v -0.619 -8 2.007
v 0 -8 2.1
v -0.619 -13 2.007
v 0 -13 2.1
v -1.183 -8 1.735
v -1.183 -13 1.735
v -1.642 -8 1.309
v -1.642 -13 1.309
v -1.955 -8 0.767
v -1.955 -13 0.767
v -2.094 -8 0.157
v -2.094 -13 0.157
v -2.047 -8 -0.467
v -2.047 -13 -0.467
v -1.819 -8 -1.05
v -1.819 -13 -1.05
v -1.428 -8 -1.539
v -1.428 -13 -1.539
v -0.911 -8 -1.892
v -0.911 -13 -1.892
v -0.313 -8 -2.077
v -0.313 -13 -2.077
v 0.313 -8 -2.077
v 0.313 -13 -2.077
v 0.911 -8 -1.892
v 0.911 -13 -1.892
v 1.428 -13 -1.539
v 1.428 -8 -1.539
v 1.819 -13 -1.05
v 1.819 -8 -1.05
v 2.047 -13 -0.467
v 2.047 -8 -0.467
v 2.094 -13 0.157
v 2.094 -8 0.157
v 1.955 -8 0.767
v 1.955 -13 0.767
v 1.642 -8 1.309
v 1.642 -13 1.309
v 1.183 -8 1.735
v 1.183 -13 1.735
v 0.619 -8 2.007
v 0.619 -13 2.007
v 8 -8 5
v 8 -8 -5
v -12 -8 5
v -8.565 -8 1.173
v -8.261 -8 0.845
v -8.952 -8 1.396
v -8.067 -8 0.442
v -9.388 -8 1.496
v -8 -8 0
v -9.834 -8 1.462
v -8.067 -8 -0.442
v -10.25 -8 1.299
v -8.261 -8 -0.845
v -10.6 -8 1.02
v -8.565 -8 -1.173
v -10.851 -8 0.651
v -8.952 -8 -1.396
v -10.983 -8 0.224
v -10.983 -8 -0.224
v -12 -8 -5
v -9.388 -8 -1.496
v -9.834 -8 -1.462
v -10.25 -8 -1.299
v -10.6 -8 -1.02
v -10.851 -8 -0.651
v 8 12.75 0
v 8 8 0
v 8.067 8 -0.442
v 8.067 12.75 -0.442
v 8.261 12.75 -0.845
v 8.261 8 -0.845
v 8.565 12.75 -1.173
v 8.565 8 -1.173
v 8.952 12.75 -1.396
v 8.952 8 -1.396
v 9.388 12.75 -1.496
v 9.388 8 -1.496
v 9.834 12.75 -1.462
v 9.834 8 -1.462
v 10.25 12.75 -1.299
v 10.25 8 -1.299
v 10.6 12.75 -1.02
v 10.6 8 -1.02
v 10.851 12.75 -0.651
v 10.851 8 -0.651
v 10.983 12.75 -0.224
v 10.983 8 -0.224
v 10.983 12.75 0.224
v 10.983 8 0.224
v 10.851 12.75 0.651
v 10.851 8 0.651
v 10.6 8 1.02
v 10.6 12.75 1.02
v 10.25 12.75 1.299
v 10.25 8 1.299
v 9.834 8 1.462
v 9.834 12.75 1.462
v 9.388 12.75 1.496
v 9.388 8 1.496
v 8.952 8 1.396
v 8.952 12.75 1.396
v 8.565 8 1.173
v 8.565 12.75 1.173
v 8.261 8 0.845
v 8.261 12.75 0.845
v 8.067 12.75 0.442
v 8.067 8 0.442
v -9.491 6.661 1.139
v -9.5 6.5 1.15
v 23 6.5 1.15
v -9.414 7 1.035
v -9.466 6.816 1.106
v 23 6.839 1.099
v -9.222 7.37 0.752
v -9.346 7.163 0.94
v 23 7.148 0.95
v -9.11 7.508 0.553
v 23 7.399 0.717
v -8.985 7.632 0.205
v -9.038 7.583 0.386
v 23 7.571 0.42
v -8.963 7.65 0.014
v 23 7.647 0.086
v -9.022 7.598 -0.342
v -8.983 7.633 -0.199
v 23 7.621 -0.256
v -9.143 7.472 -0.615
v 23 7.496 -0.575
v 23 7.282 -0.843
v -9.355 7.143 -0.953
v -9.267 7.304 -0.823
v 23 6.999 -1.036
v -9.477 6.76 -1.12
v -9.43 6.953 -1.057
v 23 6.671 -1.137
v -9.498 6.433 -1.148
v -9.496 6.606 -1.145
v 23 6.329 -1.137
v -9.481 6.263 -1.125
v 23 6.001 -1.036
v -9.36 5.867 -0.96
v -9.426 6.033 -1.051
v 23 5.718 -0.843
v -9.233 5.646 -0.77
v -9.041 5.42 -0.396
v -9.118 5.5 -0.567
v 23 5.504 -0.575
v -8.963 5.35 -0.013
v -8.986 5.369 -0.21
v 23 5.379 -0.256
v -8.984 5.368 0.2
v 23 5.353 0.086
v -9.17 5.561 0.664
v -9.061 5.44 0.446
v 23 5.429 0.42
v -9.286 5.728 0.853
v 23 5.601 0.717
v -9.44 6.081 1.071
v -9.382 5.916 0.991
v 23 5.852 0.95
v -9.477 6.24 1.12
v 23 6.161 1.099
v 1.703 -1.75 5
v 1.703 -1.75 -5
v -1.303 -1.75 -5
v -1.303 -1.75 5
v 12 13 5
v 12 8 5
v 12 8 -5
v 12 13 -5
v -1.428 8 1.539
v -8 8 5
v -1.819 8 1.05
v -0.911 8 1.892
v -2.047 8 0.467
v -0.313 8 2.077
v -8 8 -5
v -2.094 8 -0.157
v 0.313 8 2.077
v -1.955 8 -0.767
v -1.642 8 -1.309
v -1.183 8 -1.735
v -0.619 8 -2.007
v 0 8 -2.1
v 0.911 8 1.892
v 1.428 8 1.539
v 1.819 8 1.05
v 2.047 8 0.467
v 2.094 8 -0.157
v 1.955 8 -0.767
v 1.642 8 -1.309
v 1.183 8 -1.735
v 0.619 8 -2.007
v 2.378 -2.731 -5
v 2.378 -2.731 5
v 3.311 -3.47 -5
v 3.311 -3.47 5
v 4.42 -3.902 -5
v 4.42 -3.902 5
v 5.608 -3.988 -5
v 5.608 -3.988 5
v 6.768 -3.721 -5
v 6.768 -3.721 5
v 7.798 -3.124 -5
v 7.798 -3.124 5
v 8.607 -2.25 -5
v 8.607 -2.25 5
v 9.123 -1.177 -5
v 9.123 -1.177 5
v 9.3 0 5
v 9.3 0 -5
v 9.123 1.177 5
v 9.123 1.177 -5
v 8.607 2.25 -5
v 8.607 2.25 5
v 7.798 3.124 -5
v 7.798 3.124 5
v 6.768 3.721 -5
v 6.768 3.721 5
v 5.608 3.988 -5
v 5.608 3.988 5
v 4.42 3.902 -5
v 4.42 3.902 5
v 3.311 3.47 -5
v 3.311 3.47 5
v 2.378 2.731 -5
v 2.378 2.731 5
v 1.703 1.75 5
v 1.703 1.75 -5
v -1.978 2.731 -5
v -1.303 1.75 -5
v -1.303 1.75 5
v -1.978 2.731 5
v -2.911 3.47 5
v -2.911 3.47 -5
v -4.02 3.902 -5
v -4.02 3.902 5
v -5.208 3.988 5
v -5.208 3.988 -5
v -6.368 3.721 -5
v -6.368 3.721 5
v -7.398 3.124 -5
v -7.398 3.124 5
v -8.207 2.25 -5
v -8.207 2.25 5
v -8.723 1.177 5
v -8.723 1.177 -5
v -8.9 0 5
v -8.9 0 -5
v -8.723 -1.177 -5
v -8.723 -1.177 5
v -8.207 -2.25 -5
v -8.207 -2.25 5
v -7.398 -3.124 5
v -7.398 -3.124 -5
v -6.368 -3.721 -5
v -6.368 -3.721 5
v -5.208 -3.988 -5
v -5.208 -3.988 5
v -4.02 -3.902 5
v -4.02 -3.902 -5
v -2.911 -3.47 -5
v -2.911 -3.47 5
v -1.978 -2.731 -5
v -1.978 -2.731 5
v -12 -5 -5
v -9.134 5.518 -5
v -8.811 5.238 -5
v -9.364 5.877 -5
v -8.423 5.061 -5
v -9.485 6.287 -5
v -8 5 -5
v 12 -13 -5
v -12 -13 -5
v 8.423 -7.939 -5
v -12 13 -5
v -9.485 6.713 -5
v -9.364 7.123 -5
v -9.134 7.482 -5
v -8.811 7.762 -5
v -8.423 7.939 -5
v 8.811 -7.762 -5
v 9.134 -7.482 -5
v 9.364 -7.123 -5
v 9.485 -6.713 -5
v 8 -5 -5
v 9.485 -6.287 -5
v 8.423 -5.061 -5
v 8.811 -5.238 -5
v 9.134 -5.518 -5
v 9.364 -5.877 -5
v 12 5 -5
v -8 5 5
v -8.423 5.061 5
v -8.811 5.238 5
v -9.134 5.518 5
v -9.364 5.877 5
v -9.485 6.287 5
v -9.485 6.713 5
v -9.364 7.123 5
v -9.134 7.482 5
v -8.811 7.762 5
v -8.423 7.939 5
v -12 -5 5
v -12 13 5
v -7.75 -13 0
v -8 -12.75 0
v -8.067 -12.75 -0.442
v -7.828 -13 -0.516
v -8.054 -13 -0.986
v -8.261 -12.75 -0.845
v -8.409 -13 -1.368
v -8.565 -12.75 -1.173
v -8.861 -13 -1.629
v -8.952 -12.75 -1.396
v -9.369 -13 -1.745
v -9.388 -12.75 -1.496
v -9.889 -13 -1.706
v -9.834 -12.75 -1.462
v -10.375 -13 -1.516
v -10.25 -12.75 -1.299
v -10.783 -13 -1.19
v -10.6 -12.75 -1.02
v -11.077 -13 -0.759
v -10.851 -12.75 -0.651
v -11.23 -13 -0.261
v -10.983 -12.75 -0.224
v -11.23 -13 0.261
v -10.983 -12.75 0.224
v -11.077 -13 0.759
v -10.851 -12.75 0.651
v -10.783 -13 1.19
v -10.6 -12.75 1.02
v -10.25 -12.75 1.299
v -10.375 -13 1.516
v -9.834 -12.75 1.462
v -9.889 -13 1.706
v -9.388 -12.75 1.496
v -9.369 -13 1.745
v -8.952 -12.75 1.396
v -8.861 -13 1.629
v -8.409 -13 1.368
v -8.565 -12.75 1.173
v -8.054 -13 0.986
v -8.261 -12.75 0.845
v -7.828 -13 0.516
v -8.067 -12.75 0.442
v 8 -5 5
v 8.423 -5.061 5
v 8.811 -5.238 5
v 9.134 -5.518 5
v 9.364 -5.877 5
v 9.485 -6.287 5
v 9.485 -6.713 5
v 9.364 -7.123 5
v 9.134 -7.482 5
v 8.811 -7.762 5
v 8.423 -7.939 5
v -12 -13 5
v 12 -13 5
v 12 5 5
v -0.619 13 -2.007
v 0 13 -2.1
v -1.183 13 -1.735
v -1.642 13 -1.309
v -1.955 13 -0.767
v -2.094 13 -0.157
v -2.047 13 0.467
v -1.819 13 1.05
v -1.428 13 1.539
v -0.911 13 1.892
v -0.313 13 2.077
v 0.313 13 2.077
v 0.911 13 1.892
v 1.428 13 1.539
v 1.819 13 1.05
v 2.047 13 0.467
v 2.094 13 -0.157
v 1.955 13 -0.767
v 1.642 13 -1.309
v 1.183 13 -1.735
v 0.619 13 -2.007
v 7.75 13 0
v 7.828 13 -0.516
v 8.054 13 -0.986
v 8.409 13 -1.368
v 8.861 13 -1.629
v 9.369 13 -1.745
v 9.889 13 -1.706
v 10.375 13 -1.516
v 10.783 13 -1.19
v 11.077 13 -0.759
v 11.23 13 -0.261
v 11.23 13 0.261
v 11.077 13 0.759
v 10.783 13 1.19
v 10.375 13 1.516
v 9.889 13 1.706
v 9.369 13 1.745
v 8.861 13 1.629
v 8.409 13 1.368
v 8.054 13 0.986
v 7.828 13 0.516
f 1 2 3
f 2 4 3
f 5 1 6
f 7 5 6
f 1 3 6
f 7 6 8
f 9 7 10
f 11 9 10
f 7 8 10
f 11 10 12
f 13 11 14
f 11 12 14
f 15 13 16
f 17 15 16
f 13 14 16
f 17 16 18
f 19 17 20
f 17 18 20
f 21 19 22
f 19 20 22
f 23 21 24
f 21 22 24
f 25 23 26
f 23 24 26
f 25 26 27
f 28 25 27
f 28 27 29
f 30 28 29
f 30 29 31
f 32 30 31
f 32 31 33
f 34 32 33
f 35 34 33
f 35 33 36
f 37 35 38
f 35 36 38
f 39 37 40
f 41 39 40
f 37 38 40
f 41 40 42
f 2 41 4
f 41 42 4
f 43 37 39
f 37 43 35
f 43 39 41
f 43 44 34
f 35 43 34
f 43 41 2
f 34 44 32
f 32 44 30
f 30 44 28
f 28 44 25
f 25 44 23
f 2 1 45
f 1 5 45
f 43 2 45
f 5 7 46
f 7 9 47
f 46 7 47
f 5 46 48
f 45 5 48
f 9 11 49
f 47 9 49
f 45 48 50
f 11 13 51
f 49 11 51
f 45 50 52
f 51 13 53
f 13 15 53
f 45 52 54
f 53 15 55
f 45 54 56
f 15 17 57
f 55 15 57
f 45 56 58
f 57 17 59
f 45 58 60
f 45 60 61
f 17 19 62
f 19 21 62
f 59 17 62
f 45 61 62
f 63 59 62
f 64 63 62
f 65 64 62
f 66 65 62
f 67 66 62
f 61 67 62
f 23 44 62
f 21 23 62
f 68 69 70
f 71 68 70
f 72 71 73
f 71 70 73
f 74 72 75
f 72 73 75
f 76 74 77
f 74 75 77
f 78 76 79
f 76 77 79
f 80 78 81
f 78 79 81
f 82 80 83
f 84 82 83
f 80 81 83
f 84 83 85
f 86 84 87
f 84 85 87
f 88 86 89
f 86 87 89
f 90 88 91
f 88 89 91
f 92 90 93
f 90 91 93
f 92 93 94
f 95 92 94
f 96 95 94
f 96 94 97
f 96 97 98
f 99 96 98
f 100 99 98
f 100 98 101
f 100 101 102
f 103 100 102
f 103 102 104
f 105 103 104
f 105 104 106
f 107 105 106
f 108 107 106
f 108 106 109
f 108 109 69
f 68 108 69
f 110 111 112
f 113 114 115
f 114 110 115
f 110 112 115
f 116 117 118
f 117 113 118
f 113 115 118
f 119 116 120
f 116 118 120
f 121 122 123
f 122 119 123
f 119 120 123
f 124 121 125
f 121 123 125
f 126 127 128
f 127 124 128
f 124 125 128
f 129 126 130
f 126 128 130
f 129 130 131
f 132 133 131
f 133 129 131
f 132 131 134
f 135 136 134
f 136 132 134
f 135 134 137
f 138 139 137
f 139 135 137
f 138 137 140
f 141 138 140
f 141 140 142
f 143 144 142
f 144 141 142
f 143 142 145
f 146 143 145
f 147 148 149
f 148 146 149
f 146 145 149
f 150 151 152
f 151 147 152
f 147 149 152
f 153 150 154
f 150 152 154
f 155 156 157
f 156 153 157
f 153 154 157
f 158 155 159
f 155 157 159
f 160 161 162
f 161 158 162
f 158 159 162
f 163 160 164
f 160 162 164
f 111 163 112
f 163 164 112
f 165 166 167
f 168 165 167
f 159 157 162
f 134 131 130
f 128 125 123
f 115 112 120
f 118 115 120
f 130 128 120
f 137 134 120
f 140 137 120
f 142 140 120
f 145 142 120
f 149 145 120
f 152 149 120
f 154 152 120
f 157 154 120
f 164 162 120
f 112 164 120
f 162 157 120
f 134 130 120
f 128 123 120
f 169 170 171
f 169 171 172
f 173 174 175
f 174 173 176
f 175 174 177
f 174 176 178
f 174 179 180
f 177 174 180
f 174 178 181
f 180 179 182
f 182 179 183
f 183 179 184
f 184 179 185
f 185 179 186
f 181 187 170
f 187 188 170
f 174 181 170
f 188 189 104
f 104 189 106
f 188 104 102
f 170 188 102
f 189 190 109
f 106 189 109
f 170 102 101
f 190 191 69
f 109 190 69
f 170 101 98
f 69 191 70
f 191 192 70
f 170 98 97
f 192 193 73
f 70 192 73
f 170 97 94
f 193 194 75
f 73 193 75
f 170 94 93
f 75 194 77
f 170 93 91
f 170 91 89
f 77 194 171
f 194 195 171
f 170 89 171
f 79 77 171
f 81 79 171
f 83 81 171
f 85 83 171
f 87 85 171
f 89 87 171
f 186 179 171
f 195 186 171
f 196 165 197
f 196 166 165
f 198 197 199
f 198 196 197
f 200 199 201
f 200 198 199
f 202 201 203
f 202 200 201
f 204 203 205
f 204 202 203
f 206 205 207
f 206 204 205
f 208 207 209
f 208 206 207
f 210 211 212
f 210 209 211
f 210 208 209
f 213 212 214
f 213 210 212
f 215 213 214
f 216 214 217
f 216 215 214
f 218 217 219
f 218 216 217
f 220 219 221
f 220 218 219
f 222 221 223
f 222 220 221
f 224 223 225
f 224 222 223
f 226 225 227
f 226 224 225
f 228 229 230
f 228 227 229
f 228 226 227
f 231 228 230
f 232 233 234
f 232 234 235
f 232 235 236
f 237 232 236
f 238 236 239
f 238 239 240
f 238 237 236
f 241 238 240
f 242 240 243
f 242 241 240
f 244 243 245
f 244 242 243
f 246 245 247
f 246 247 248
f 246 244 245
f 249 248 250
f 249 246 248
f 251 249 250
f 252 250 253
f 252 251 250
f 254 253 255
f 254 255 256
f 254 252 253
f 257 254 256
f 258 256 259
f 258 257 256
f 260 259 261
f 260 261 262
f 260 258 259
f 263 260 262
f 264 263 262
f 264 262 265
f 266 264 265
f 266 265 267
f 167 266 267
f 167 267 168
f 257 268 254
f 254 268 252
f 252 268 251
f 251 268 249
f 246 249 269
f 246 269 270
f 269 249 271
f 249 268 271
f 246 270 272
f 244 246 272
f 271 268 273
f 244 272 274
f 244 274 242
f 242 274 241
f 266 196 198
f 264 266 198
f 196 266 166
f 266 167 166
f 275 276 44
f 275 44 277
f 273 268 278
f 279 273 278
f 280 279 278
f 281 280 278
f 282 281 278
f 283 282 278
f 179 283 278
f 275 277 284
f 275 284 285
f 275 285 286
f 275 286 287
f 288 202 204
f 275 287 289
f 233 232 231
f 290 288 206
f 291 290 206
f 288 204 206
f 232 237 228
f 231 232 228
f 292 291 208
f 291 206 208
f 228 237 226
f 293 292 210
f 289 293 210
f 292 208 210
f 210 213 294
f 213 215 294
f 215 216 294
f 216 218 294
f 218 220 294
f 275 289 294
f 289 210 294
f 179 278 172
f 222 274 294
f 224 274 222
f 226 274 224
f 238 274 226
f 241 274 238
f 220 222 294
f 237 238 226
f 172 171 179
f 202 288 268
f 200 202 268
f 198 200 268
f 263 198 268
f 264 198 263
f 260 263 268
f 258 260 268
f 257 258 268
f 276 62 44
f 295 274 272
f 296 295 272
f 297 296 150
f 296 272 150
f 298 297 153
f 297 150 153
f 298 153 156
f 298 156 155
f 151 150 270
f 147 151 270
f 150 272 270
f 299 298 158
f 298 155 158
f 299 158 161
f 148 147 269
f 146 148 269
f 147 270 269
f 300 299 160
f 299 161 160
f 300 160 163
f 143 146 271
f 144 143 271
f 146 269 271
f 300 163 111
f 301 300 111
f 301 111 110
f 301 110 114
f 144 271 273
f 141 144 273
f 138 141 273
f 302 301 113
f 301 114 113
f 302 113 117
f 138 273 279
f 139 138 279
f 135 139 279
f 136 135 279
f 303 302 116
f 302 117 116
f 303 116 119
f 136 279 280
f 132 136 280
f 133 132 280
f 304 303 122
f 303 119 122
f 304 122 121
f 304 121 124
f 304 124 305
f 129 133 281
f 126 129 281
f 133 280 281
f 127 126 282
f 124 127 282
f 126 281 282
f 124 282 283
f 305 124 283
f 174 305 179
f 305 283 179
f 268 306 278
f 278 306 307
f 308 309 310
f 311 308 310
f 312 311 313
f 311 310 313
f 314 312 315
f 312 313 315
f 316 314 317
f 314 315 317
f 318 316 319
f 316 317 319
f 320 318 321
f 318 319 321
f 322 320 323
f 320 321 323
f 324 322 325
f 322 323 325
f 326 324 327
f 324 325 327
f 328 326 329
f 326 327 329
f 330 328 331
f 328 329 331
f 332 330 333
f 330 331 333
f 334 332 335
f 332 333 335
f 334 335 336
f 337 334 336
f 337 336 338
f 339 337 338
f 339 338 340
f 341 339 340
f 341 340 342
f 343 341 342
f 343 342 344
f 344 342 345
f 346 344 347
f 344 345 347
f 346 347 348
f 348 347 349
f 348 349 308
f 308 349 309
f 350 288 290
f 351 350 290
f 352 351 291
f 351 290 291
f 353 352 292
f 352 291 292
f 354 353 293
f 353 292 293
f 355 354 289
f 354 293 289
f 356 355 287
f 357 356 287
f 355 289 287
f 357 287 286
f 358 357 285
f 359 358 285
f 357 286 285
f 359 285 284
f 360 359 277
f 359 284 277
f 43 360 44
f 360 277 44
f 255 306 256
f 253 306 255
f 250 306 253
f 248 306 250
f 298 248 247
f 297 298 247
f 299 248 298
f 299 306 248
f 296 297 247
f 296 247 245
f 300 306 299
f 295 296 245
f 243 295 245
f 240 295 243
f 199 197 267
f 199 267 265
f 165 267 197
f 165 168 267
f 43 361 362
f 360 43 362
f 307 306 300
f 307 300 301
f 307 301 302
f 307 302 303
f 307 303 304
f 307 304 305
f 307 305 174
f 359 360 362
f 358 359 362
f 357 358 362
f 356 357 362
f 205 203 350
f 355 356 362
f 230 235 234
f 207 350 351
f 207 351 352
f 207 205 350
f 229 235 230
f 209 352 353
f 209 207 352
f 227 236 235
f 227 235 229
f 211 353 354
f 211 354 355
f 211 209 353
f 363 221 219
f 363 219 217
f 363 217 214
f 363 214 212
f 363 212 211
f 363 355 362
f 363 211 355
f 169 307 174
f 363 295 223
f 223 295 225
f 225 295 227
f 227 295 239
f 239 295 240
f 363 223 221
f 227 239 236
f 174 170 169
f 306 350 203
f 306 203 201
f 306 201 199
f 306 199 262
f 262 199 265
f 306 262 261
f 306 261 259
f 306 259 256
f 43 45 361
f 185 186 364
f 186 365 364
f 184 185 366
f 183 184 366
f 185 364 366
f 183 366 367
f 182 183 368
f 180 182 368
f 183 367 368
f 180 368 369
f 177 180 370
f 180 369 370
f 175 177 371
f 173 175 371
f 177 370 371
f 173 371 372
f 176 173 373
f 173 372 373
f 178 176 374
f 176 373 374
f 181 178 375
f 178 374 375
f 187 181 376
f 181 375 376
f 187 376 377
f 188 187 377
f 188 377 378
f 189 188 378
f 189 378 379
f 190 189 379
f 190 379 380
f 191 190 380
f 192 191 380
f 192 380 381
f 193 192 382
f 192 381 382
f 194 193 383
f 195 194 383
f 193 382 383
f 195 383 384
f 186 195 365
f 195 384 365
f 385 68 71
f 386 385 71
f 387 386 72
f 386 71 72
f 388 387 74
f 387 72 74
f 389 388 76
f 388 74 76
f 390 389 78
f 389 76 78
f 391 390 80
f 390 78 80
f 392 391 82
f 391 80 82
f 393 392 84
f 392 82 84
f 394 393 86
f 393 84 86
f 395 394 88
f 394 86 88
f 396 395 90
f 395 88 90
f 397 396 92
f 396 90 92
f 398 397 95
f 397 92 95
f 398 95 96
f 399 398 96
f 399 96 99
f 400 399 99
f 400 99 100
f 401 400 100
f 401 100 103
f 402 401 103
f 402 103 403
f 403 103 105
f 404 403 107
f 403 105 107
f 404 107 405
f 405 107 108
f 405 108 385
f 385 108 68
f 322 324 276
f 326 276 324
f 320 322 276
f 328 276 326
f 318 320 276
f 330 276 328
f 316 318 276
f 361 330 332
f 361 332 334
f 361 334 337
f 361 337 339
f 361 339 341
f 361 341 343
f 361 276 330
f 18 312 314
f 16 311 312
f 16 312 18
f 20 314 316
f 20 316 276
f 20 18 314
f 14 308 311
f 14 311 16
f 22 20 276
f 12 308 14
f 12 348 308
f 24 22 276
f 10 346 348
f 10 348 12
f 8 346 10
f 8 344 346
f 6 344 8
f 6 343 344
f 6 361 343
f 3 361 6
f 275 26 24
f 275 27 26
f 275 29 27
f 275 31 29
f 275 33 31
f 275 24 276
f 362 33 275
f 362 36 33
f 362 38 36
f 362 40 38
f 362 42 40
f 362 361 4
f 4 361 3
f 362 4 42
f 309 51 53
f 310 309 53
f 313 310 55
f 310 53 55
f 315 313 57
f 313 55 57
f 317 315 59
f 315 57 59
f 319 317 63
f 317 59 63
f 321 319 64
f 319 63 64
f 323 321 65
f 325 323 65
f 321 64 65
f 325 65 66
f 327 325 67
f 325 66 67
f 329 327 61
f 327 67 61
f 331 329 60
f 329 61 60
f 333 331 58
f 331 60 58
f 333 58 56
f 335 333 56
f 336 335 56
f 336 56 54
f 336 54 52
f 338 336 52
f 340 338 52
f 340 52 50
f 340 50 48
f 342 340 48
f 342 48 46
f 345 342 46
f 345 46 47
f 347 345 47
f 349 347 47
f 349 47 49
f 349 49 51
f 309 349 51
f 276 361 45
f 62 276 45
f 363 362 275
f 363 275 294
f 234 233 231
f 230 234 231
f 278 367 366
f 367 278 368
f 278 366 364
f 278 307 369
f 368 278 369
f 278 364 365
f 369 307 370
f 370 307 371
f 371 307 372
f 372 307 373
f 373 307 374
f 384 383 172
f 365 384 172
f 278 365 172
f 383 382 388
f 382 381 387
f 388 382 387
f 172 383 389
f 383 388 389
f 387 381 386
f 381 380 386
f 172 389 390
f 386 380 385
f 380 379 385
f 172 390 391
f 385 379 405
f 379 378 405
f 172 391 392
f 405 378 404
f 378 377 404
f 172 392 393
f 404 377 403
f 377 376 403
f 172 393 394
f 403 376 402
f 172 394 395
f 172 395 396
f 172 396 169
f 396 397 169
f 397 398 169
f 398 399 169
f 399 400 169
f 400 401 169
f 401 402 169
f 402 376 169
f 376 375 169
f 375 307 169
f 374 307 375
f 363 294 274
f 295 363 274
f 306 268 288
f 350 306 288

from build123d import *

# Parameters (mm, degrees)
SKIZZE1_W                            = 24
SKIZZE1_H                            = 26
AUFSATZ_LINEAR_AUSTRAGEN1_DEPTH      = 10
SCHNITT_LINEAR_AUSTRAGEN1_DEPTH      = 21.322401433
SCHNITT_LINEAR_AUSTRAGEN2_DEPTH      = 21.322401433
SCHNITT_LINEAR_AUSTRAGEN3_DEPTH      = 21.322401433
SKIZZE5_W                            = 4
SKIZZE5_H                            = 10
SKIZZE6_W                            = 4
SKIZZE6_H                            = 10
F_2_3_2_3_DURCHMESSER_BOHRUNG1_D     = 2.3
F_2_3_2_3_DURCHMESSER_BOHRUNG1_DEPTH = 24
SKIZZE9_W                            = 2.1
SKIZZE9_H                            = 5
F_3_0_3_DURCHMESSER_BOHRUNG1_D       = 3
F_3_0_3_DURCHMESSER_BOHRUNG1_DEPTH   = 5
SKIZZE13_W                           = 2.1
SKIZZE13_H                           = 5
F_3_0_3_DURCHMESSER_BOHRUNG2_D       = 3
F_3_0_3_DURCHMESSER_BOHRUNG2_DEPTH   = 5
FASE1_SIZE                           = 0.25
SENSORKABEL_START                    = -35
SKIZZE24_R                           = 1.15
SENSORKABEL_DEPTH                    = 35


with BuildPart() as part:
    # Skizze1 → Aufsatz-Linear austragen1 (new body)
    with BuildSketch(Plane.XY.offset(5)):
        Rectangle(SKIZZE1_W, SKIZZE1_H)
    extrude(amount=-AUFSATZ_LINEAR_AUSTRAGEN1_DEPTH)

    # Skizze2 → Schnitt-Linear austragen1 (cut, through all)
    with BuildSketch(Plane(origin=(0, 0, -5), x_dir=(-1, 0, 0), z_dir=(0, 0, -1))):
        with BuildLine():
            Line((12, -8), (12, -5))
            Line((12, -5), (-8, -5))
            ThreePointArc((-8, -5), (-9.5, -6.5), (-8, -8))
            Line((-8, -8), (12, -8))
        make_face()
    extrude(amount=-SCHNITT_LINEAR_AUSTRAGEN1_DEPTH, mode=Mode.SUBTRACT)

    # Skizze3 → Schnitt-Linear austragen2 (cut, through all)
    with BuildSketch(Plane(origin=(0, 0, -5), x_dir=(-1, 0, 0), z_dir=(0, 0, -1))):
        with BuildLine():
            Line((-12, 8), (-12, 5))
            Line((-12, 5), (8, 5))
            ThreePointArc((8, 5), (9.5, 6.5), (8, 8))
            Line((8, 8), (-12, 8))
        make_face()
    extrude(amount=-SCHNITT_LINEAR_AUSTRAGEN2_DEPTH, mode=Mode.SUBTRACT)

    # Skizze4 → Schnitt-Linear austragen3 (cut, through all)
    with BuildSketch(Plane(origin=(0, 0, -5), x_dir=(-1, 0, 0), z_dir=(0, 0, -1))):
        with BuildLine():
            Line((-1.703126358, -1.75), (1.303126358, -1.75))
            ThreePointArc((1.303126358, -1.75), (0.9, 0), (1.303126358, 1.75))
            Line((1.303126358, 1.75), (-1.703126358, 1.75))
            ThreePointArc((-1.703126358, 1.75), (-1.3, 0), (-1.703126358, -1.75))
        make_face()
    extrude(amount=-SCHNITT_LINEAR_AUSTRAGEN3_DEPTH, mode=Mode.SUBTRACT)

    # Skizze5 → Schnitt-Rotation1 (revolve, cut)
    with BuildSketch(Plane(origin=(0, 0, 0), x_dir=(1, 0, 0), z_dir=(0, 1, 0))):
        with Locations((7.3, 0)):
            Rectangle(SKIZZE5_W, SKIZZE5_H)
    revolve(axis=Axis((5.3, 0, -5), (0, 0, 1)), mode=Mode.SUBTRACT)

    # Skizze6 → Schnitt-Rotation2 (revolve, cut)
    with BuildSketch(Plane(origin=(0, 0, 0), x_dir=(1, 0, 0), z_dir=(0, 1, 0))):
        with Locations((-2.9, 0)):
            Rectangle(SKIZZE6_W, SKIZZE6_H)
    revolve(axis=Axis((-4.9, 0, -5), (0, 0, 1)), mode=Mode.SUBTRACT)

    # Ø2.3 (2.3) Durchmesser Bohrung1
    with Locations(Plane.ZY.offset(12)):
        with Locations((0, 6.5)):
            Hole(F_2_3_2_3_DURCHMESSER_BOHRUNG1_D / 2, depth=F_2_3_2_3_DURCHMESSER_BOHRUNG1_DEPTH)

    # Skizze9 → M5 Gewindebohrung1 (revolve, cut)
    with BuildSketch(Plane(origin=(0, 8, 0), x_dir=(0, 0, -1), z_dir=(1, 0, 0))):
        with Locations((1.05, 2.5)):
            Rectangle(SKIZZE9_W, SKIZZE9_H)
    revolve(axis=Axis((0, 1.65, 0), (0, 1, 0)), mode=Mode.SUBTRACT)

    # Ø3.0 (3) Durchmesser Bohrung1
    with Locations(Plane(origin=(0, 13, 0), x_dir=(1, 0, 0), z_dir=(0, 1, 0))):
        with Locations((9.5, 0)):
            Hole(F_3_0_3_DURCHMESSER_BOHRUNG1_D / 2, depth=F_3_0_3_DURCHMESSER_BOHRUNG1_DEPTH)

    # Skizze13 → M5 Gewindebohrung2 (revolve, cut)
    with BuildSketch(Plane(origin=(0, -8, 0), x_dir=(0, 0, 1), z_dir=(1, 0, 0))):
        with Locations((1.05, 2.5)):
            Rectangle(SKIZZE13_W, SKIZZE13_H)
    revolve(axis=Axis((0, -1.65, 0), (0, -1, 0)), mode=Mode.SUBTRACT)

    # Ø3.0 (3) Durchmesser Bohrung2
    with Locations(Plane(origin=(0, -13, 0), x_dir=(-1, 0, 0), z_dir=(0, -1, 0))):
        with Locations((9.5, 0)):
            Hole(F_3_0_3_DURCHMESSER_BOHRUNG2_D / 2, depth=F_3_0_3_DURCHMESSER_BOHRUNG2_DEPTH)

    # Fase1
    fase1_edges = [part.edges().sort_by_distance(p)[0] for p in [
        (11, 13, 0),
        (-11, -13, 0),
    ]]
    chamfer(fase1_edges, length=FASE1_SIZE)

    # Skizze24 → Sensorkabel (add)
    with BuildSketch(Plane.ZY.offset(12).offset(SENSORKABEL_START)):
        with Locations((0, 6.5)):
            Circle(SKIZZE24_R)
    extrude(amount=SENSORKABEL_DEPTH)


solid = part.part
